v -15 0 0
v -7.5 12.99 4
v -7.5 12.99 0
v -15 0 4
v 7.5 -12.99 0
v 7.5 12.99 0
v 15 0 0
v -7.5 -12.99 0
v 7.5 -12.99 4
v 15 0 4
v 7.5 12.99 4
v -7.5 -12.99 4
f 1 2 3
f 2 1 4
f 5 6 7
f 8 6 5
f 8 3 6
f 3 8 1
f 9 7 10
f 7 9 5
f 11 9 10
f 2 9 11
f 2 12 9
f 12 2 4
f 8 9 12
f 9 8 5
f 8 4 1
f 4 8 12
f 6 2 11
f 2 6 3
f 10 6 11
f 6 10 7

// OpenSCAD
// resolution bezier curve
deltat = 0.02;

// cubic bexier curve function
function cubic_bezier(p0,p1,p2,p3) = [for (t=[0:deltat:1+deltat]) pow(1-t,3)*p0+3*pow((1-t),2)*t*p1+3*(1-t)*pow(t,2)*p2+pow(t,3)*p3];
    
function reverse(v) = [for (i=[len(v)-1:-1:0]) v[i]];

p10 = [-4.75,4.001];
p11 = [-2.75,4.0];
p12 = [-4.8,2.2];
p13 = [0.0,2.0];

p20 = [4.75,4.001];
p21 = [2.75,4.0];
p22 = [4.8,2.2];
p23 = [0.0,2.0];



// bezier curve for cx
points_left = cubic_bezier(p10, p11, p12, p13);
points_right = reverse(cubic_bezier(p20, p21, p22, p23));
points = concat(points_left, points_right);


difference()
{
    color("Peru", 1.0)
    {
        // hexagon base
        linear_extrude(height = 4, center = false, convexity = 10, twist = 0)
        circle(r=15, $fn=6);
    }
    
    color("Blue", 1.0)
    {
        // canal shape
        rotate([90,0,0])
        linear_extrude(height=30, center=true, convexity = 10, twist = 0)
        polygon(points);
    }
    
    color("Blue", 1.0)
    {
        // canal shape
        translate([-22.5,-12.99,0])
        rotate_extrude(angle=360, convexity=10, $fn=90)
        translate([22.5,0,0])
        polygon(points);
    }
    
}
